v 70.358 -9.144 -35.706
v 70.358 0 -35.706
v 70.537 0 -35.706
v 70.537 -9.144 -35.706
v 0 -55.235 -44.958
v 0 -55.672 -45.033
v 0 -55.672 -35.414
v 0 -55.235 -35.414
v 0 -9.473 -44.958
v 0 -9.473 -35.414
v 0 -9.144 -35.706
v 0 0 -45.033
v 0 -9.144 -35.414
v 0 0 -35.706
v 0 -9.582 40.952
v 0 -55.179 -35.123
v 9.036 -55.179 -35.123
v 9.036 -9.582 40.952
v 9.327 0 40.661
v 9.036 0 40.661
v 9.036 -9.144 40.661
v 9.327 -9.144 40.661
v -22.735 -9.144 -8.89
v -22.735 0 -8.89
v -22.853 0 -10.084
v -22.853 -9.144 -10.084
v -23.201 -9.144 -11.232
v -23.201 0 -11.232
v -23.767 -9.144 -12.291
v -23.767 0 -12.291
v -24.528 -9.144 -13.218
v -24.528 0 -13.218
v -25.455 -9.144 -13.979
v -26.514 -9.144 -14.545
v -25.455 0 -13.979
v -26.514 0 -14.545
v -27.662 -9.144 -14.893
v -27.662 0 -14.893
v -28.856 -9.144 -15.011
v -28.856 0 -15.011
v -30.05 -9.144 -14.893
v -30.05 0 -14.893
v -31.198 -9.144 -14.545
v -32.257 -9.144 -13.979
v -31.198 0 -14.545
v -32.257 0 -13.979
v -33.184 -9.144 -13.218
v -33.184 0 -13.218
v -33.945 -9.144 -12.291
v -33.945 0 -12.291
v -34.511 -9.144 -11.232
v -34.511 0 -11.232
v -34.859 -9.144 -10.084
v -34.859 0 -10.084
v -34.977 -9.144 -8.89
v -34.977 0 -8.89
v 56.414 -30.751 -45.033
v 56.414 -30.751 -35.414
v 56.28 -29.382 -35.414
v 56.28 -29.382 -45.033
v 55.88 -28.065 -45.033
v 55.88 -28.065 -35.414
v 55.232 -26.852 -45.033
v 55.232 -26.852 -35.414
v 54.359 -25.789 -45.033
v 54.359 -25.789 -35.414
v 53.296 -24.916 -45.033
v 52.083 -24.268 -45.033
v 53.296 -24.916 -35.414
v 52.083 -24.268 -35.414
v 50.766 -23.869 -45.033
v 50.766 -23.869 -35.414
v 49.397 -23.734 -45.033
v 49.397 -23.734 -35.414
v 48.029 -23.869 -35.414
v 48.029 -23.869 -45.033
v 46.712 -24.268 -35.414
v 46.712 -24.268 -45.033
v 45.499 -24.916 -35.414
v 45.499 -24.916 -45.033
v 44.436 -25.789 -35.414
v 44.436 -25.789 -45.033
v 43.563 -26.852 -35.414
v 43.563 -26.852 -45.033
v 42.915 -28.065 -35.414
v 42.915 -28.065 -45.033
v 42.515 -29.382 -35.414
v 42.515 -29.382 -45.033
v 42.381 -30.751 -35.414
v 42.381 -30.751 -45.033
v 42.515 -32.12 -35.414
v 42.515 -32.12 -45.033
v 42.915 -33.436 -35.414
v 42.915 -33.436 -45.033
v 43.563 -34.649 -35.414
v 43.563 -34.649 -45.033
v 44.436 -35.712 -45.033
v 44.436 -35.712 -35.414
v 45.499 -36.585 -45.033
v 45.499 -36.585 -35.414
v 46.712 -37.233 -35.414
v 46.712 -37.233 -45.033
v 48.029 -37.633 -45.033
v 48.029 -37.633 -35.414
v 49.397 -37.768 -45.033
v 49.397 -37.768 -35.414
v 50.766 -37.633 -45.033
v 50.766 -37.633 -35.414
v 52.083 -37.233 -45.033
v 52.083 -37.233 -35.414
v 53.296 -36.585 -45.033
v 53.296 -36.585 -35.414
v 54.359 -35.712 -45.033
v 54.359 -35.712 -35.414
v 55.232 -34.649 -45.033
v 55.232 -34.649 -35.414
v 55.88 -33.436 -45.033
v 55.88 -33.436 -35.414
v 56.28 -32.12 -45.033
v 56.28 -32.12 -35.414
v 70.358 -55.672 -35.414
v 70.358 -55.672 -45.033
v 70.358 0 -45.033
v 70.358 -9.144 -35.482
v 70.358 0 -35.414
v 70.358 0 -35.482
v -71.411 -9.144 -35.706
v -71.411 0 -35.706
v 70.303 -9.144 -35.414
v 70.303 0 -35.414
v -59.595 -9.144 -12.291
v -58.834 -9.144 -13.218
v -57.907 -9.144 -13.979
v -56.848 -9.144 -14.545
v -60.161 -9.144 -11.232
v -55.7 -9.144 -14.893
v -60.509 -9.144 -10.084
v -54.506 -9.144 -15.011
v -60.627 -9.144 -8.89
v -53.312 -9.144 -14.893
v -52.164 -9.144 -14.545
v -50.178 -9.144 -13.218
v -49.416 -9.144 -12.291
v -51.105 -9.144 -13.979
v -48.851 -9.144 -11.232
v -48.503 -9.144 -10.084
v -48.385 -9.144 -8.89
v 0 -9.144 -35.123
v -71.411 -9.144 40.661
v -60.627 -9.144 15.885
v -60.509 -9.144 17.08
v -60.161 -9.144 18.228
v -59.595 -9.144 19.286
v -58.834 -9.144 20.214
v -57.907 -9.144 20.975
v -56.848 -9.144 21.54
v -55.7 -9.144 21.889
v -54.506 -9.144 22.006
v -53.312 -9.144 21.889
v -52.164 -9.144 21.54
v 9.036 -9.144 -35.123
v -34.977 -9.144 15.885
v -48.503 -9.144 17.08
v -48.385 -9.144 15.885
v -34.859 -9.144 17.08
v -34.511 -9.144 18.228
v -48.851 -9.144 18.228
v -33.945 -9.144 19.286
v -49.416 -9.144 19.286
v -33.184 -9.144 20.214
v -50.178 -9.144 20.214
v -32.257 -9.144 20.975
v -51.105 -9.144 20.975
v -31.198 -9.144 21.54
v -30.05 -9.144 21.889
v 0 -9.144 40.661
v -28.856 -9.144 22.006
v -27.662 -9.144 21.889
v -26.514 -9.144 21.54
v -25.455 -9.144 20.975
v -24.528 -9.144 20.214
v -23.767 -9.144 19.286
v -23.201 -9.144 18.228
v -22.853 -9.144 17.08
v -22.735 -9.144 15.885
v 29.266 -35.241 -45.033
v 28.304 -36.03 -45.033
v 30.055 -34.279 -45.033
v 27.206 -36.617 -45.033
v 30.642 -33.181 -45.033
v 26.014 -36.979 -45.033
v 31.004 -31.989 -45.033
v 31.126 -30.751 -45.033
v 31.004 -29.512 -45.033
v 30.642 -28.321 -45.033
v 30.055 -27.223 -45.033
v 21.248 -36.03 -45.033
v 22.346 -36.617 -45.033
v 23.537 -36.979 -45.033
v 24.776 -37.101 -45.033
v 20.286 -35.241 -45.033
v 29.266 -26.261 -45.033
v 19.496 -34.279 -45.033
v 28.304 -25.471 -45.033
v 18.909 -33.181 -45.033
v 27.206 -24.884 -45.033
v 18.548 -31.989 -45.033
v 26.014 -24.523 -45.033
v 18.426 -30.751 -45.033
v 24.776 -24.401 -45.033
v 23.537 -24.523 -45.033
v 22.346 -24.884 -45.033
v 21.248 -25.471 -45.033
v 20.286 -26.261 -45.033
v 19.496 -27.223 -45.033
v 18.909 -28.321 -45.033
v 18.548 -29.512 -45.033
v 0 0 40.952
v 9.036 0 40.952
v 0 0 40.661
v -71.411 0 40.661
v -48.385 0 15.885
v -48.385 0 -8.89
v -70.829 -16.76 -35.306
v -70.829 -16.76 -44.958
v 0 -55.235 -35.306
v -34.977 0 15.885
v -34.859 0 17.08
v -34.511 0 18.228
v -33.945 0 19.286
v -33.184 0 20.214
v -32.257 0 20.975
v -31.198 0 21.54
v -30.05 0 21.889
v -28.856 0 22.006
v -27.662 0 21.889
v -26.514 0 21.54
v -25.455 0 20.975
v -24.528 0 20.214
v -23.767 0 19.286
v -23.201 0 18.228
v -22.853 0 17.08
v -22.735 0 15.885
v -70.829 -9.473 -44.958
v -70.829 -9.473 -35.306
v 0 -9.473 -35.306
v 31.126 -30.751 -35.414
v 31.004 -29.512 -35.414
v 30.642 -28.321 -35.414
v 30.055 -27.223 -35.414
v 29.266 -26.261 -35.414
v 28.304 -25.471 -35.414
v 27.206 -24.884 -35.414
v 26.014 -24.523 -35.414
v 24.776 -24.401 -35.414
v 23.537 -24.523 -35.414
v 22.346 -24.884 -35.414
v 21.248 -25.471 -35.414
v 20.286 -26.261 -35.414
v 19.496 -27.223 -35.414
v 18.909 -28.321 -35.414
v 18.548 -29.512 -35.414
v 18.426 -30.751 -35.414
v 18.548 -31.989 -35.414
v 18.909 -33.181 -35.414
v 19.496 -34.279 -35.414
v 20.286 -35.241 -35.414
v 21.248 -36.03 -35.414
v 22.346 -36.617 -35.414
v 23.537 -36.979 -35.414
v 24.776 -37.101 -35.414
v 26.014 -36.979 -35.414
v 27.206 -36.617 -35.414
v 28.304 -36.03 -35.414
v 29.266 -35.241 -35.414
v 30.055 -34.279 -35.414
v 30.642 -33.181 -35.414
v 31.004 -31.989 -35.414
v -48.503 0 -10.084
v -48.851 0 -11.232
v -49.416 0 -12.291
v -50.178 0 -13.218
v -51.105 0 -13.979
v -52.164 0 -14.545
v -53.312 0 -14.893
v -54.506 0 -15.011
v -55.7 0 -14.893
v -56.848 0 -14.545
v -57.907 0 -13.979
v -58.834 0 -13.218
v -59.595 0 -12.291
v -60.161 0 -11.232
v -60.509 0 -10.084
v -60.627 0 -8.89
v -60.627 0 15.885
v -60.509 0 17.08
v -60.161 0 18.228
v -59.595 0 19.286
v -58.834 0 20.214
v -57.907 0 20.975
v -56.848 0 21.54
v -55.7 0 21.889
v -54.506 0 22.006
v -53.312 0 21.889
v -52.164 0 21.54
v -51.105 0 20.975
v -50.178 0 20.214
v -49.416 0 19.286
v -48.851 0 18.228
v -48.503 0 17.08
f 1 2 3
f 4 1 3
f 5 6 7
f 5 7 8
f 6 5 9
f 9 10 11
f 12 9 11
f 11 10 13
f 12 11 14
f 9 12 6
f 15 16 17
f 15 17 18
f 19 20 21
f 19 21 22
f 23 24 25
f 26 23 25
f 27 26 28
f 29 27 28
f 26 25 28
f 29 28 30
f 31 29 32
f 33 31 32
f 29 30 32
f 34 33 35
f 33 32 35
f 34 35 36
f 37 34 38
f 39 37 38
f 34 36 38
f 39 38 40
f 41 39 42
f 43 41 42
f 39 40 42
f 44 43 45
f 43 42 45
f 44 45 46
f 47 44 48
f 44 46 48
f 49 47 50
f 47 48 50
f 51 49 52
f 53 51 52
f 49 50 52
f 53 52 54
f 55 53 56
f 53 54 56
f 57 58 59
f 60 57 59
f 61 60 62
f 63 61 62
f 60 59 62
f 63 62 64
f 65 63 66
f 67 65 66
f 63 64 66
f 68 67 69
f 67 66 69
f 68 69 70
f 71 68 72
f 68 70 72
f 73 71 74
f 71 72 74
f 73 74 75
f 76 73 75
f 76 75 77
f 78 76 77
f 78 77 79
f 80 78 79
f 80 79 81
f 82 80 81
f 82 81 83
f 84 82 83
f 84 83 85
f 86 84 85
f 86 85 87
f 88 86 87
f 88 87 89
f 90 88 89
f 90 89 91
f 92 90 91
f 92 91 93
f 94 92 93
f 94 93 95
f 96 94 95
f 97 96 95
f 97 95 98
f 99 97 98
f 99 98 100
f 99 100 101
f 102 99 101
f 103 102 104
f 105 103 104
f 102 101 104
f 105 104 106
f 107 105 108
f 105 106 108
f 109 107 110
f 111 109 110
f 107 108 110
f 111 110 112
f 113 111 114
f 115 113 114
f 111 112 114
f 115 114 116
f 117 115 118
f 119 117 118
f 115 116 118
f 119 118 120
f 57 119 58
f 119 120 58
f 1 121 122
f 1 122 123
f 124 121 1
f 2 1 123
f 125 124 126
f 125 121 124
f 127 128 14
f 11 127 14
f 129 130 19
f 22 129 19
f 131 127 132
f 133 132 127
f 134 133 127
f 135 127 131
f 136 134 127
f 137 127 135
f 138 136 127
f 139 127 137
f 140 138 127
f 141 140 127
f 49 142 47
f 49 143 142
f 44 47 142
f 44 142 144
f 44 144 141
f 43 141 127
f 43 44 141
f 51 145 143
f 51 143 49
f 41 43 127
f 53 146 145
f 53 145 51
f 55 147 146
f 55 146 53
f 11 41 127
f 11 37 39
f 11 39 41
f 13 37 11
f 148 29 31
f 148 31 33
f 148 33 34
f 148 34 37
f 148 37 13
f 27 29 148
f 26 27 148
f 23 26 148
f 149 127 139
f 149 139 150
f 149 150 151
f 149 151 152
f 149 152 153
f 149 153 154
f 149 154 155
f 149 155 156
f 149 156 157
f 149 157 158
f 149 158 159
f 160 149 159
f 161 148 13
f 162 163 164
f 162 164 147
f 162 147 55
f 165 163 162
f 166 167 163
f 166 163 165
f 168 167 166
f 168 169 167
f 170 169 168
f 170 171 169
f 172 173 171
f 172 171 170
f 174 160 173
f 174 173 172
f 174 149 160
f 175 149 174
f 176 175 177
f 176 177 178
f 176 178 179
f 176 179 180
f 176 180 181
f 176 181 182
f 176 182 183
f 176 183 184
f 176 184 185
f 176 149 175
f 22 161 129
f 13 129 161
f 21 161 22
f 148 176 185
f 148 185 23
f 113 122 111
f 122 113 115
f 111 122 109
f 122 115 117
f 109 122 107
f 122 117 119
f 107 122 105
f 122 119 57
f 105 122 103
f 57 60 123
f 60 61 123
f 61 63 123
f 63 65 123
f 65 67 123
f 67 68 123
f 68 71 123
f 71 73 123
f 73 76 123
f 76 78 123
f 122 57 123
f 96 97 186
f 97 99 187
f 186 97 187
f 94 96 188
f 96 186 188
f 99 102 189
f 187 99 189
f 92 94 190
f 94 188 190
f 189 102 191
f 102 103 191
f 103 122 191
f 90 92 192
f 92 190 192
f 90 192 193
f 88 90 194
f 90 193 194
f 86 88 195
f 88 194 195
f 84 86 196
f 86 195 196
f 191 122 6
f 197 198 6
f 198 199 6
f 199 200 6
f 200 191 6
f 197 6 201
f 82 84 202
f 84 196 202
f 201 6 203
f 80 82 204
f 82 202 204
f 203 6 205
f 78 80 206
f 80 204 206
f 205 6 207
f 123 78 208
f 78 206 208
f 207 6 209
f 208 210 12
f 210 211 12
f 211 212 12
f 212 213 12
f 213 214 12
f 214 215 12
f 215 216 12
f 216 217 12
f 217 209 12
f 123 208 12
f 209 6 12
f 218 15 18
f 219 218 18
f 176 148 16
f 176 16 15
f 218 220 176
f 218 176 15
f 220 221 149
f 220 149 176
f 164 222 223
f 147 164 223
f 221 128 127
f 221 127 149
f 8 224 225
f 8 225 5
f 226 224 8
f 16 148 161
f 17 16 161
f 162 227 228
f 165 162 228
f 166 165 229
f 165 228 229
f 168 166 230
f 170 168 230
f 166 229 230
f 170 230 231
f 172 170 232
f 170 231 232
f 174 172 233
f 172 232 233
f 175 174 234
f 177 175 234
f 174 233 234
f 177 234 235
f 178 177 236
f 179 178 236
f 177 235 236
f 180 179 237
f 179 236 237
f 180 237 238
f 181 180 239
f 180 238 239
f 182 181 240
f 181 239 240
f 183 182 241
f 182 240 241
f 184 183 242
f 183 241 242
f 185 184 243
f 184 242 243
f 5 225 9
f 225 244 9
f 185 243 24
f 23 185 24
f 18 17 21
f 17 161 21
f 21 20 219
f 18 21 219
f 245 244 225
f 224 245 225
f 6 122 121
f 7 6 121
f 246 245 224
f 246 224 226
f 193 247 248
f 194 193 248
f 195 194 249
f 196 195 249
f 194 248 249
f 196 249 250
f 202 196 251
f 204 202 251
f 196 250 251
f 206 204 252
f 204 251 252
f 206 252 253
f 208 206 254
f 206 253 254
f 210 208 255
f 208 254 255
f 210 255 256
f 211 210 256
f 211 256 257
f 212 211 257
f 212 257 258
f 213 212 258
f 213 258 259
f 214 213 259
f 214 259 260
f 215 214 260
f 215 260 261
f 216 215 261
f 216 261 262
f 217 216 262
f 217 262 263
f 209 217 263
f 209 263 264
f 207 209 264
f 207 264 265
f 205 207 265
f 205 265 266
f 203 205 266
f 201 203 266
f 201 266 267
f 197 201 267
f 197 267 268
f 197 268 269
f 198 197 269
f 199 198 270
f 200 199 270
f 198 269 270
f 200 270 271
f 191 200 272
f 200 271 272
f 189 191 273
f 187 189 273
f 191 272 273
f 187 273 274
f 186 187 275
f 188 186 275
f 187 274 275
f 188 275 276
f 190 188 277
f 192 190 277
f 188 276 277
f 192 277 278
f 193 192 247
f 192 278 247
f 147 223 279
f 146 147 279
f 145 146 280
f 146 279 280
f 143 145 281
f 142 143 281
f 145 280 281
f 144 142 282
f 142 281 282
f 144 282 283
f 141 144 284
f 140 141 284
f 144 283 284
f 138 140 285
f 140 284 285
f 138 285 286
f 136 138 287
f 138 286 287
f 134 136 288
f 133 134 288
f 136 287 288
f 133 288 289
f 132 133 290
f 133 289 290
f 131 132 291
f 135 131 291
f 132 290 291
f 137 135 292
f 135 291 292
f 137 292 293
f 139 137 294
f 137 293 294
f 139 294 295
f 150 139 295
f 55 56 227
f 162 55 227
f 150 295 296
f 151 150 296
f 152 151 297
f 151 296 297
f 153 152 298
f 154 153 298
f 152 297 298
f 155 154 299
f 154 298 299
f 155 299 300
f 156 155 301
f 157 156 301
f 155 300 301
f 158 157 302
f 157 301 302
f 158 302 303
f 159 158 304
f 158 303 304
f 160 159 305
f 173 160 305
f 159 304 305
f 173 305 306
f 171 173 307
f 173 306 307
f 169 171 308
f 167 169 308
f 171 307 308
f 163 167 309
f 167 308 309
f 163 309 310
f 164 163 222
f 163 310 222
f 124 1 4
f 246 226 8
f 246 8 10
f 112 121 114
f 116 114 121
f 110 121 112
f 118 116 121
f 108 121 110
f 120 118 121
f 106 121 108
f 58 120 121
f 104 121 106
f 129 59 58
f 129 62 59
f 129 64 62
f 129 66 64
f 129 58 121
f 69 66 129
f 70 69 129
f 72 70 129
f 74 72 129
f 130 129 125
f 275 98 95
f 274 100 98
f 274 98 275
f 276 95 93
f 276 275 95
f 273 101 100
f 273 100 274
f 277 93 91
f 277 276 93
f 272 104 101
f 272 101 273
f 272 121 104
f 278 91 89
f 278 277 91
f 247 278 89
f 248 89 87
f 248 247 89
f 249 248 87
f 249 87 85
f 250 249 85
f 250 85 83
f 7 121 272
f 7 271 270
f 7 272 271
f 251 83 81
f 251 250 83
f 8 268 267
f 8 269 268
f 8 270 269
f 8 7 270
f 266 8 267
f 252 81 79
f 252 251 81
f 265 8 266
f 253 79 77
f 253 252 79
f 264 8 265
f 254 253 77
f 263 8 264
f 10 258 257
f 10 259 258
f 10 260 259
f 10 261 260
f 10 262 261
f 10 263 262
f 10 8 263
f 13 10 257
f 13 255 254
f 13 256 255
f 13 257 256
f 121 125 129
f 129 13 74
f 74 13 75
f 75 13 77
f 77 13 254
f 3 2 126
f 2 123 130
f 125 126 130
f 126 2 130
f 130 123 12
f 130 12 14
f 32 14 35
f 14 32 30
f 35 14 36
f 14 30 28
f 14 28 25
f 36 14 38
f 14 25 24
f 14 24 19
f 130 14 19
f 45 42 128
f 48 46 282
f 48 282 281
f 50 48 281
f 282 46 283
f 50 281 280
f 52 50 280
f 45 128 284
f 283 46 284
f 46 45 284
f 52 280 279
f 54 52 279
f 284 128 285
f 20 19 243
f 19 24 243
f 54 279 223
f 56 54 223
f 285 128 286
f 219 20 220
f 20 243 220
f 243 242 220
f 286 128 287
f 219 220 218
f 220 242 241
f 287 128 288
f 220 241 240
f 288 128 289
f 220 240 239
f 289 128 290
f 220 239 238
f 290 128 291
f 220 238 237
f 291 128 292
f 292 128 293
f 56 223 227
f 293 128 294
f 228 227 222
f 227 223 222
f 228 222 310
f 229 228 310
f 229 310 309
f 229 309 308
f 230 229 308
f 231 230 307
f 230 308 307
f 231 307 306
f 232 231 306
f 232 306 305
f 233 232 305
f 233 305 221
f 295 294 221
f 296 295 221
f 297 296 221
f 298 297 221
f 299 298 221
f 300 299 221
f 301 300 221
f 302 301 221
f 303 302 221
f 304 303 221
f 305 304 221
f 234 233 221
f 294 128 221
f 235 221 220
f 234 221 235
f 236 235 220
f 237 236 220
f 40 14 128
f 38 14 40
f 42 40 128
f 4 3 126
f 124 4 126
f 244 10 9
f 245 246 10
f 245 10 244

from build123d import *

# Parameters (mm, degrees)
F0_W         = 80.7386888191
F0_H         = 76.366558671
F1_DEPTH     = 9.144
F2_W         = 55.6718036532
F2_H         = 9.6186883748
F3_DEPTH     = 70.358
F4_W         = 9.0357391164
F4_H         = 76.0750807822
F5_DEPTH     = 55.626
F6_SIZE      = 45.72
F7_T1_DEPTH  = 167.084926268
F8_T1_DEPTH  = 193.8162932759
F9_T4_DEPTH  = 127.8865685488
F10_T4_DEPTH = 246.7691481608
F12_DEPTH    = 44.958
F14_DEPTH    = 35.306
F15_R        = 6.35
F15_R_2      = 7.0169538455
F16_DEPTH    = 55.372


# Not quite as in the source:
# - a fillet or chamfer that OpenCascade refuses, or shapes differently, is made with other operations: its cross-section is extruded or revolved along the edge and cut away or added


with BuildPart() as f1:
    # F0 (on Front) → F1 (new body)
    with BuildSketch(Plane.XZ):
        with Locations((-31.0421311297, 2.4775415659)):
            Rectangle(F0_W, F0_H)
        with BuildLine():
            Line((-60.626886785, -8.890000172), (-60.626886785, 15.8854108304))
            ThreePointArc((-60.626886785, 15.8854108304), (-54.5059032738, 22.0063943416), (-48.3849197626, 15.8854108304))
            Line((-48.3849197626, 15.8854108304), (-48.3849197626, -8.890000172))
            ThreePointArc((-48.3849197626, -8.890000172), (-54.5059032738, -15.0109836832), (-60.626886785, -8.890000172))
        make_face(mode=Mode.SUBTRACT)
        with BuildLine():
            Line((-34.9770486355, -8.890000172), (-34.9770486355, 15.8854108304))
            ThreePointArc((-34.9770486355, 15.8854108304), (-28.8560651243, 22.0063943416), (-22.7350816131, 15.8854108304))
            Line((-22.7350816131, 15.8854108304), (-22.7350816131, -8.890000172))
            ThreePointArc((-22.7350816131, -8.890000172), (-28.8560651243, -15.0109836832), (-34.9770486355, -8.890000172))
        make_face(mode=Mode.SUBTRACT)
        Polygon((70.5370530486, -35.7057377696), (9.3272132799, 40.6608209014), (9.3272132799, -35.7057377696), align=None)
    extrude(amount=F1_DEPTH)

    # F2 (on Right) → F3 (join)
    with BuildSketch(Plane.YZ):
        with Locations((-27.8359018266, -40.2236077935)):
            Rectangle(F2_W, F2_H)
    extrude(amount=F3_DEPTH)

    # F4 (on Front) → F5 (join)
    with BuildSketch(Plane.XZ):
        with Locations((4.5178695582, 2.9147546738)):
            Rectangle(F4_W, F4_H)
    extrude(amount=F5_DEPTH)

    # F6
    f6_edges = [f1.edges().sort_by_distance(p)[0] for p in [
        (4.51787, -55.626, 40.952295),
    ]]
    chamfer(f6_edges, length=F6_SIZE)

    # F7: chamfer of 30.48 on 1 edges, made by hand

    # F7_s2 → F7_t1 (cut)
    with BuildSketch(Plane.YZ.offset(-79.0245935758)):
        Polygon((-34.0733853094, 16.7849097555), (-55.626, -35.2477049351), (-55.626, -4.7677049351), align=None)
    extrude(amount=F7_T1_DEPTH, mode=Mode.SUBTRACT)

    # F8: chamfer of 35.56 on 1 edges, made by hand

    # F8_s2 → F8_t1 (cut)
    with BuildSketch(Plane.YZ.offset(-92.3902770798)):
        Polygon((-8.9286681704, 41.9296268945), (-47.6816081643, -16.0682464206), (-34.0733853094, 16.7849097555), align=None)
    extrude(amount=F8_T1_DEPTH, mode=Mode.SUBTRACT)

    # F9: chamfer of 22.86 on 1 edges, made by hand


with BuildPart() as f9_tool2:
    # F9_s3 → F9_t4 (new body)
    with BuildSketch(Plane.YZ.offset(-59.4254147162)):
        Polygon((-34.9812726375, 2.9391489166), (-56.4297514282, -37.1881325338), (-47.6816081643, -16.0682464206), align=None)
    extrude(amount=F9_T4_DEPTH)

    split(bisect_by=Plane.XY.offset(-35.4142636061), keep=Keep.TOP)


with BuildPart() as f1_1:
    add(f1.part)

    # F9_t1: cut F9_tool2
    add(f9_tool2.part, mode=Mode.SUBTRACT)

    # F10: chamfer of 45.72 on 1 edges, made by hand


with BuildPart() as f10_tool2:
    # F10_s3 → F10_t4 (new body)
    with BuildSketch(Plane.YZ.offset(-118.8667045222)):
        Polygon((-56.5335314452, -37.3822912894), (-9.5806015838, 40.9539395911), (-34.9812726375, 2.9391489166), align=None)
    extrude(amount=F10_T4_DEPTH)

    split(bisect_by=Plane.XY.offset(-35.1227857172), keep=Keep.TOP)


with BuildPart() as f1_2:
    add(f1_1.part)

    # F10_t1: cut F10_tool2
    add(f10_tool2.part, mode=Mode.SUBTRACT)

    # F11 (on Top) → F12 (join)
    with BuildSketch(Plane.XY):
        Polygon((-70.8285272121, -16.7598351836), (0, -55.2345886827), (0, -9.472951293), (-70.8285272121, -9.472951293), align=None)
    extrude(amount=-F12_DEPTH)

    # F13 (on Top) → F14 (cut)
    with BuildSketch(Plane.XY):
        Polygon((0, -9.1814752668), (-71.4114755392, -9.1814752668), (-71.4114755392, -16.4683610201), (0, -55.8175444603), align=None)
    extrude(amount=-F14_DEPTH, mode=Mode.SUBTRACT)

    # F15 (on Top) → F16 (cut)
    with BuildSketch(Plane.XY):
        with Locations((24.775644736, -30.7506565005)):
            Circle(F15_R)
        with Locations((49.3974882285, -30.7506565005)):
            Circle(F15_R_2)
    extrude(amount=-F16_DEPTH, mode=Mode.SUBTRACT)


solid = f1_2.part
